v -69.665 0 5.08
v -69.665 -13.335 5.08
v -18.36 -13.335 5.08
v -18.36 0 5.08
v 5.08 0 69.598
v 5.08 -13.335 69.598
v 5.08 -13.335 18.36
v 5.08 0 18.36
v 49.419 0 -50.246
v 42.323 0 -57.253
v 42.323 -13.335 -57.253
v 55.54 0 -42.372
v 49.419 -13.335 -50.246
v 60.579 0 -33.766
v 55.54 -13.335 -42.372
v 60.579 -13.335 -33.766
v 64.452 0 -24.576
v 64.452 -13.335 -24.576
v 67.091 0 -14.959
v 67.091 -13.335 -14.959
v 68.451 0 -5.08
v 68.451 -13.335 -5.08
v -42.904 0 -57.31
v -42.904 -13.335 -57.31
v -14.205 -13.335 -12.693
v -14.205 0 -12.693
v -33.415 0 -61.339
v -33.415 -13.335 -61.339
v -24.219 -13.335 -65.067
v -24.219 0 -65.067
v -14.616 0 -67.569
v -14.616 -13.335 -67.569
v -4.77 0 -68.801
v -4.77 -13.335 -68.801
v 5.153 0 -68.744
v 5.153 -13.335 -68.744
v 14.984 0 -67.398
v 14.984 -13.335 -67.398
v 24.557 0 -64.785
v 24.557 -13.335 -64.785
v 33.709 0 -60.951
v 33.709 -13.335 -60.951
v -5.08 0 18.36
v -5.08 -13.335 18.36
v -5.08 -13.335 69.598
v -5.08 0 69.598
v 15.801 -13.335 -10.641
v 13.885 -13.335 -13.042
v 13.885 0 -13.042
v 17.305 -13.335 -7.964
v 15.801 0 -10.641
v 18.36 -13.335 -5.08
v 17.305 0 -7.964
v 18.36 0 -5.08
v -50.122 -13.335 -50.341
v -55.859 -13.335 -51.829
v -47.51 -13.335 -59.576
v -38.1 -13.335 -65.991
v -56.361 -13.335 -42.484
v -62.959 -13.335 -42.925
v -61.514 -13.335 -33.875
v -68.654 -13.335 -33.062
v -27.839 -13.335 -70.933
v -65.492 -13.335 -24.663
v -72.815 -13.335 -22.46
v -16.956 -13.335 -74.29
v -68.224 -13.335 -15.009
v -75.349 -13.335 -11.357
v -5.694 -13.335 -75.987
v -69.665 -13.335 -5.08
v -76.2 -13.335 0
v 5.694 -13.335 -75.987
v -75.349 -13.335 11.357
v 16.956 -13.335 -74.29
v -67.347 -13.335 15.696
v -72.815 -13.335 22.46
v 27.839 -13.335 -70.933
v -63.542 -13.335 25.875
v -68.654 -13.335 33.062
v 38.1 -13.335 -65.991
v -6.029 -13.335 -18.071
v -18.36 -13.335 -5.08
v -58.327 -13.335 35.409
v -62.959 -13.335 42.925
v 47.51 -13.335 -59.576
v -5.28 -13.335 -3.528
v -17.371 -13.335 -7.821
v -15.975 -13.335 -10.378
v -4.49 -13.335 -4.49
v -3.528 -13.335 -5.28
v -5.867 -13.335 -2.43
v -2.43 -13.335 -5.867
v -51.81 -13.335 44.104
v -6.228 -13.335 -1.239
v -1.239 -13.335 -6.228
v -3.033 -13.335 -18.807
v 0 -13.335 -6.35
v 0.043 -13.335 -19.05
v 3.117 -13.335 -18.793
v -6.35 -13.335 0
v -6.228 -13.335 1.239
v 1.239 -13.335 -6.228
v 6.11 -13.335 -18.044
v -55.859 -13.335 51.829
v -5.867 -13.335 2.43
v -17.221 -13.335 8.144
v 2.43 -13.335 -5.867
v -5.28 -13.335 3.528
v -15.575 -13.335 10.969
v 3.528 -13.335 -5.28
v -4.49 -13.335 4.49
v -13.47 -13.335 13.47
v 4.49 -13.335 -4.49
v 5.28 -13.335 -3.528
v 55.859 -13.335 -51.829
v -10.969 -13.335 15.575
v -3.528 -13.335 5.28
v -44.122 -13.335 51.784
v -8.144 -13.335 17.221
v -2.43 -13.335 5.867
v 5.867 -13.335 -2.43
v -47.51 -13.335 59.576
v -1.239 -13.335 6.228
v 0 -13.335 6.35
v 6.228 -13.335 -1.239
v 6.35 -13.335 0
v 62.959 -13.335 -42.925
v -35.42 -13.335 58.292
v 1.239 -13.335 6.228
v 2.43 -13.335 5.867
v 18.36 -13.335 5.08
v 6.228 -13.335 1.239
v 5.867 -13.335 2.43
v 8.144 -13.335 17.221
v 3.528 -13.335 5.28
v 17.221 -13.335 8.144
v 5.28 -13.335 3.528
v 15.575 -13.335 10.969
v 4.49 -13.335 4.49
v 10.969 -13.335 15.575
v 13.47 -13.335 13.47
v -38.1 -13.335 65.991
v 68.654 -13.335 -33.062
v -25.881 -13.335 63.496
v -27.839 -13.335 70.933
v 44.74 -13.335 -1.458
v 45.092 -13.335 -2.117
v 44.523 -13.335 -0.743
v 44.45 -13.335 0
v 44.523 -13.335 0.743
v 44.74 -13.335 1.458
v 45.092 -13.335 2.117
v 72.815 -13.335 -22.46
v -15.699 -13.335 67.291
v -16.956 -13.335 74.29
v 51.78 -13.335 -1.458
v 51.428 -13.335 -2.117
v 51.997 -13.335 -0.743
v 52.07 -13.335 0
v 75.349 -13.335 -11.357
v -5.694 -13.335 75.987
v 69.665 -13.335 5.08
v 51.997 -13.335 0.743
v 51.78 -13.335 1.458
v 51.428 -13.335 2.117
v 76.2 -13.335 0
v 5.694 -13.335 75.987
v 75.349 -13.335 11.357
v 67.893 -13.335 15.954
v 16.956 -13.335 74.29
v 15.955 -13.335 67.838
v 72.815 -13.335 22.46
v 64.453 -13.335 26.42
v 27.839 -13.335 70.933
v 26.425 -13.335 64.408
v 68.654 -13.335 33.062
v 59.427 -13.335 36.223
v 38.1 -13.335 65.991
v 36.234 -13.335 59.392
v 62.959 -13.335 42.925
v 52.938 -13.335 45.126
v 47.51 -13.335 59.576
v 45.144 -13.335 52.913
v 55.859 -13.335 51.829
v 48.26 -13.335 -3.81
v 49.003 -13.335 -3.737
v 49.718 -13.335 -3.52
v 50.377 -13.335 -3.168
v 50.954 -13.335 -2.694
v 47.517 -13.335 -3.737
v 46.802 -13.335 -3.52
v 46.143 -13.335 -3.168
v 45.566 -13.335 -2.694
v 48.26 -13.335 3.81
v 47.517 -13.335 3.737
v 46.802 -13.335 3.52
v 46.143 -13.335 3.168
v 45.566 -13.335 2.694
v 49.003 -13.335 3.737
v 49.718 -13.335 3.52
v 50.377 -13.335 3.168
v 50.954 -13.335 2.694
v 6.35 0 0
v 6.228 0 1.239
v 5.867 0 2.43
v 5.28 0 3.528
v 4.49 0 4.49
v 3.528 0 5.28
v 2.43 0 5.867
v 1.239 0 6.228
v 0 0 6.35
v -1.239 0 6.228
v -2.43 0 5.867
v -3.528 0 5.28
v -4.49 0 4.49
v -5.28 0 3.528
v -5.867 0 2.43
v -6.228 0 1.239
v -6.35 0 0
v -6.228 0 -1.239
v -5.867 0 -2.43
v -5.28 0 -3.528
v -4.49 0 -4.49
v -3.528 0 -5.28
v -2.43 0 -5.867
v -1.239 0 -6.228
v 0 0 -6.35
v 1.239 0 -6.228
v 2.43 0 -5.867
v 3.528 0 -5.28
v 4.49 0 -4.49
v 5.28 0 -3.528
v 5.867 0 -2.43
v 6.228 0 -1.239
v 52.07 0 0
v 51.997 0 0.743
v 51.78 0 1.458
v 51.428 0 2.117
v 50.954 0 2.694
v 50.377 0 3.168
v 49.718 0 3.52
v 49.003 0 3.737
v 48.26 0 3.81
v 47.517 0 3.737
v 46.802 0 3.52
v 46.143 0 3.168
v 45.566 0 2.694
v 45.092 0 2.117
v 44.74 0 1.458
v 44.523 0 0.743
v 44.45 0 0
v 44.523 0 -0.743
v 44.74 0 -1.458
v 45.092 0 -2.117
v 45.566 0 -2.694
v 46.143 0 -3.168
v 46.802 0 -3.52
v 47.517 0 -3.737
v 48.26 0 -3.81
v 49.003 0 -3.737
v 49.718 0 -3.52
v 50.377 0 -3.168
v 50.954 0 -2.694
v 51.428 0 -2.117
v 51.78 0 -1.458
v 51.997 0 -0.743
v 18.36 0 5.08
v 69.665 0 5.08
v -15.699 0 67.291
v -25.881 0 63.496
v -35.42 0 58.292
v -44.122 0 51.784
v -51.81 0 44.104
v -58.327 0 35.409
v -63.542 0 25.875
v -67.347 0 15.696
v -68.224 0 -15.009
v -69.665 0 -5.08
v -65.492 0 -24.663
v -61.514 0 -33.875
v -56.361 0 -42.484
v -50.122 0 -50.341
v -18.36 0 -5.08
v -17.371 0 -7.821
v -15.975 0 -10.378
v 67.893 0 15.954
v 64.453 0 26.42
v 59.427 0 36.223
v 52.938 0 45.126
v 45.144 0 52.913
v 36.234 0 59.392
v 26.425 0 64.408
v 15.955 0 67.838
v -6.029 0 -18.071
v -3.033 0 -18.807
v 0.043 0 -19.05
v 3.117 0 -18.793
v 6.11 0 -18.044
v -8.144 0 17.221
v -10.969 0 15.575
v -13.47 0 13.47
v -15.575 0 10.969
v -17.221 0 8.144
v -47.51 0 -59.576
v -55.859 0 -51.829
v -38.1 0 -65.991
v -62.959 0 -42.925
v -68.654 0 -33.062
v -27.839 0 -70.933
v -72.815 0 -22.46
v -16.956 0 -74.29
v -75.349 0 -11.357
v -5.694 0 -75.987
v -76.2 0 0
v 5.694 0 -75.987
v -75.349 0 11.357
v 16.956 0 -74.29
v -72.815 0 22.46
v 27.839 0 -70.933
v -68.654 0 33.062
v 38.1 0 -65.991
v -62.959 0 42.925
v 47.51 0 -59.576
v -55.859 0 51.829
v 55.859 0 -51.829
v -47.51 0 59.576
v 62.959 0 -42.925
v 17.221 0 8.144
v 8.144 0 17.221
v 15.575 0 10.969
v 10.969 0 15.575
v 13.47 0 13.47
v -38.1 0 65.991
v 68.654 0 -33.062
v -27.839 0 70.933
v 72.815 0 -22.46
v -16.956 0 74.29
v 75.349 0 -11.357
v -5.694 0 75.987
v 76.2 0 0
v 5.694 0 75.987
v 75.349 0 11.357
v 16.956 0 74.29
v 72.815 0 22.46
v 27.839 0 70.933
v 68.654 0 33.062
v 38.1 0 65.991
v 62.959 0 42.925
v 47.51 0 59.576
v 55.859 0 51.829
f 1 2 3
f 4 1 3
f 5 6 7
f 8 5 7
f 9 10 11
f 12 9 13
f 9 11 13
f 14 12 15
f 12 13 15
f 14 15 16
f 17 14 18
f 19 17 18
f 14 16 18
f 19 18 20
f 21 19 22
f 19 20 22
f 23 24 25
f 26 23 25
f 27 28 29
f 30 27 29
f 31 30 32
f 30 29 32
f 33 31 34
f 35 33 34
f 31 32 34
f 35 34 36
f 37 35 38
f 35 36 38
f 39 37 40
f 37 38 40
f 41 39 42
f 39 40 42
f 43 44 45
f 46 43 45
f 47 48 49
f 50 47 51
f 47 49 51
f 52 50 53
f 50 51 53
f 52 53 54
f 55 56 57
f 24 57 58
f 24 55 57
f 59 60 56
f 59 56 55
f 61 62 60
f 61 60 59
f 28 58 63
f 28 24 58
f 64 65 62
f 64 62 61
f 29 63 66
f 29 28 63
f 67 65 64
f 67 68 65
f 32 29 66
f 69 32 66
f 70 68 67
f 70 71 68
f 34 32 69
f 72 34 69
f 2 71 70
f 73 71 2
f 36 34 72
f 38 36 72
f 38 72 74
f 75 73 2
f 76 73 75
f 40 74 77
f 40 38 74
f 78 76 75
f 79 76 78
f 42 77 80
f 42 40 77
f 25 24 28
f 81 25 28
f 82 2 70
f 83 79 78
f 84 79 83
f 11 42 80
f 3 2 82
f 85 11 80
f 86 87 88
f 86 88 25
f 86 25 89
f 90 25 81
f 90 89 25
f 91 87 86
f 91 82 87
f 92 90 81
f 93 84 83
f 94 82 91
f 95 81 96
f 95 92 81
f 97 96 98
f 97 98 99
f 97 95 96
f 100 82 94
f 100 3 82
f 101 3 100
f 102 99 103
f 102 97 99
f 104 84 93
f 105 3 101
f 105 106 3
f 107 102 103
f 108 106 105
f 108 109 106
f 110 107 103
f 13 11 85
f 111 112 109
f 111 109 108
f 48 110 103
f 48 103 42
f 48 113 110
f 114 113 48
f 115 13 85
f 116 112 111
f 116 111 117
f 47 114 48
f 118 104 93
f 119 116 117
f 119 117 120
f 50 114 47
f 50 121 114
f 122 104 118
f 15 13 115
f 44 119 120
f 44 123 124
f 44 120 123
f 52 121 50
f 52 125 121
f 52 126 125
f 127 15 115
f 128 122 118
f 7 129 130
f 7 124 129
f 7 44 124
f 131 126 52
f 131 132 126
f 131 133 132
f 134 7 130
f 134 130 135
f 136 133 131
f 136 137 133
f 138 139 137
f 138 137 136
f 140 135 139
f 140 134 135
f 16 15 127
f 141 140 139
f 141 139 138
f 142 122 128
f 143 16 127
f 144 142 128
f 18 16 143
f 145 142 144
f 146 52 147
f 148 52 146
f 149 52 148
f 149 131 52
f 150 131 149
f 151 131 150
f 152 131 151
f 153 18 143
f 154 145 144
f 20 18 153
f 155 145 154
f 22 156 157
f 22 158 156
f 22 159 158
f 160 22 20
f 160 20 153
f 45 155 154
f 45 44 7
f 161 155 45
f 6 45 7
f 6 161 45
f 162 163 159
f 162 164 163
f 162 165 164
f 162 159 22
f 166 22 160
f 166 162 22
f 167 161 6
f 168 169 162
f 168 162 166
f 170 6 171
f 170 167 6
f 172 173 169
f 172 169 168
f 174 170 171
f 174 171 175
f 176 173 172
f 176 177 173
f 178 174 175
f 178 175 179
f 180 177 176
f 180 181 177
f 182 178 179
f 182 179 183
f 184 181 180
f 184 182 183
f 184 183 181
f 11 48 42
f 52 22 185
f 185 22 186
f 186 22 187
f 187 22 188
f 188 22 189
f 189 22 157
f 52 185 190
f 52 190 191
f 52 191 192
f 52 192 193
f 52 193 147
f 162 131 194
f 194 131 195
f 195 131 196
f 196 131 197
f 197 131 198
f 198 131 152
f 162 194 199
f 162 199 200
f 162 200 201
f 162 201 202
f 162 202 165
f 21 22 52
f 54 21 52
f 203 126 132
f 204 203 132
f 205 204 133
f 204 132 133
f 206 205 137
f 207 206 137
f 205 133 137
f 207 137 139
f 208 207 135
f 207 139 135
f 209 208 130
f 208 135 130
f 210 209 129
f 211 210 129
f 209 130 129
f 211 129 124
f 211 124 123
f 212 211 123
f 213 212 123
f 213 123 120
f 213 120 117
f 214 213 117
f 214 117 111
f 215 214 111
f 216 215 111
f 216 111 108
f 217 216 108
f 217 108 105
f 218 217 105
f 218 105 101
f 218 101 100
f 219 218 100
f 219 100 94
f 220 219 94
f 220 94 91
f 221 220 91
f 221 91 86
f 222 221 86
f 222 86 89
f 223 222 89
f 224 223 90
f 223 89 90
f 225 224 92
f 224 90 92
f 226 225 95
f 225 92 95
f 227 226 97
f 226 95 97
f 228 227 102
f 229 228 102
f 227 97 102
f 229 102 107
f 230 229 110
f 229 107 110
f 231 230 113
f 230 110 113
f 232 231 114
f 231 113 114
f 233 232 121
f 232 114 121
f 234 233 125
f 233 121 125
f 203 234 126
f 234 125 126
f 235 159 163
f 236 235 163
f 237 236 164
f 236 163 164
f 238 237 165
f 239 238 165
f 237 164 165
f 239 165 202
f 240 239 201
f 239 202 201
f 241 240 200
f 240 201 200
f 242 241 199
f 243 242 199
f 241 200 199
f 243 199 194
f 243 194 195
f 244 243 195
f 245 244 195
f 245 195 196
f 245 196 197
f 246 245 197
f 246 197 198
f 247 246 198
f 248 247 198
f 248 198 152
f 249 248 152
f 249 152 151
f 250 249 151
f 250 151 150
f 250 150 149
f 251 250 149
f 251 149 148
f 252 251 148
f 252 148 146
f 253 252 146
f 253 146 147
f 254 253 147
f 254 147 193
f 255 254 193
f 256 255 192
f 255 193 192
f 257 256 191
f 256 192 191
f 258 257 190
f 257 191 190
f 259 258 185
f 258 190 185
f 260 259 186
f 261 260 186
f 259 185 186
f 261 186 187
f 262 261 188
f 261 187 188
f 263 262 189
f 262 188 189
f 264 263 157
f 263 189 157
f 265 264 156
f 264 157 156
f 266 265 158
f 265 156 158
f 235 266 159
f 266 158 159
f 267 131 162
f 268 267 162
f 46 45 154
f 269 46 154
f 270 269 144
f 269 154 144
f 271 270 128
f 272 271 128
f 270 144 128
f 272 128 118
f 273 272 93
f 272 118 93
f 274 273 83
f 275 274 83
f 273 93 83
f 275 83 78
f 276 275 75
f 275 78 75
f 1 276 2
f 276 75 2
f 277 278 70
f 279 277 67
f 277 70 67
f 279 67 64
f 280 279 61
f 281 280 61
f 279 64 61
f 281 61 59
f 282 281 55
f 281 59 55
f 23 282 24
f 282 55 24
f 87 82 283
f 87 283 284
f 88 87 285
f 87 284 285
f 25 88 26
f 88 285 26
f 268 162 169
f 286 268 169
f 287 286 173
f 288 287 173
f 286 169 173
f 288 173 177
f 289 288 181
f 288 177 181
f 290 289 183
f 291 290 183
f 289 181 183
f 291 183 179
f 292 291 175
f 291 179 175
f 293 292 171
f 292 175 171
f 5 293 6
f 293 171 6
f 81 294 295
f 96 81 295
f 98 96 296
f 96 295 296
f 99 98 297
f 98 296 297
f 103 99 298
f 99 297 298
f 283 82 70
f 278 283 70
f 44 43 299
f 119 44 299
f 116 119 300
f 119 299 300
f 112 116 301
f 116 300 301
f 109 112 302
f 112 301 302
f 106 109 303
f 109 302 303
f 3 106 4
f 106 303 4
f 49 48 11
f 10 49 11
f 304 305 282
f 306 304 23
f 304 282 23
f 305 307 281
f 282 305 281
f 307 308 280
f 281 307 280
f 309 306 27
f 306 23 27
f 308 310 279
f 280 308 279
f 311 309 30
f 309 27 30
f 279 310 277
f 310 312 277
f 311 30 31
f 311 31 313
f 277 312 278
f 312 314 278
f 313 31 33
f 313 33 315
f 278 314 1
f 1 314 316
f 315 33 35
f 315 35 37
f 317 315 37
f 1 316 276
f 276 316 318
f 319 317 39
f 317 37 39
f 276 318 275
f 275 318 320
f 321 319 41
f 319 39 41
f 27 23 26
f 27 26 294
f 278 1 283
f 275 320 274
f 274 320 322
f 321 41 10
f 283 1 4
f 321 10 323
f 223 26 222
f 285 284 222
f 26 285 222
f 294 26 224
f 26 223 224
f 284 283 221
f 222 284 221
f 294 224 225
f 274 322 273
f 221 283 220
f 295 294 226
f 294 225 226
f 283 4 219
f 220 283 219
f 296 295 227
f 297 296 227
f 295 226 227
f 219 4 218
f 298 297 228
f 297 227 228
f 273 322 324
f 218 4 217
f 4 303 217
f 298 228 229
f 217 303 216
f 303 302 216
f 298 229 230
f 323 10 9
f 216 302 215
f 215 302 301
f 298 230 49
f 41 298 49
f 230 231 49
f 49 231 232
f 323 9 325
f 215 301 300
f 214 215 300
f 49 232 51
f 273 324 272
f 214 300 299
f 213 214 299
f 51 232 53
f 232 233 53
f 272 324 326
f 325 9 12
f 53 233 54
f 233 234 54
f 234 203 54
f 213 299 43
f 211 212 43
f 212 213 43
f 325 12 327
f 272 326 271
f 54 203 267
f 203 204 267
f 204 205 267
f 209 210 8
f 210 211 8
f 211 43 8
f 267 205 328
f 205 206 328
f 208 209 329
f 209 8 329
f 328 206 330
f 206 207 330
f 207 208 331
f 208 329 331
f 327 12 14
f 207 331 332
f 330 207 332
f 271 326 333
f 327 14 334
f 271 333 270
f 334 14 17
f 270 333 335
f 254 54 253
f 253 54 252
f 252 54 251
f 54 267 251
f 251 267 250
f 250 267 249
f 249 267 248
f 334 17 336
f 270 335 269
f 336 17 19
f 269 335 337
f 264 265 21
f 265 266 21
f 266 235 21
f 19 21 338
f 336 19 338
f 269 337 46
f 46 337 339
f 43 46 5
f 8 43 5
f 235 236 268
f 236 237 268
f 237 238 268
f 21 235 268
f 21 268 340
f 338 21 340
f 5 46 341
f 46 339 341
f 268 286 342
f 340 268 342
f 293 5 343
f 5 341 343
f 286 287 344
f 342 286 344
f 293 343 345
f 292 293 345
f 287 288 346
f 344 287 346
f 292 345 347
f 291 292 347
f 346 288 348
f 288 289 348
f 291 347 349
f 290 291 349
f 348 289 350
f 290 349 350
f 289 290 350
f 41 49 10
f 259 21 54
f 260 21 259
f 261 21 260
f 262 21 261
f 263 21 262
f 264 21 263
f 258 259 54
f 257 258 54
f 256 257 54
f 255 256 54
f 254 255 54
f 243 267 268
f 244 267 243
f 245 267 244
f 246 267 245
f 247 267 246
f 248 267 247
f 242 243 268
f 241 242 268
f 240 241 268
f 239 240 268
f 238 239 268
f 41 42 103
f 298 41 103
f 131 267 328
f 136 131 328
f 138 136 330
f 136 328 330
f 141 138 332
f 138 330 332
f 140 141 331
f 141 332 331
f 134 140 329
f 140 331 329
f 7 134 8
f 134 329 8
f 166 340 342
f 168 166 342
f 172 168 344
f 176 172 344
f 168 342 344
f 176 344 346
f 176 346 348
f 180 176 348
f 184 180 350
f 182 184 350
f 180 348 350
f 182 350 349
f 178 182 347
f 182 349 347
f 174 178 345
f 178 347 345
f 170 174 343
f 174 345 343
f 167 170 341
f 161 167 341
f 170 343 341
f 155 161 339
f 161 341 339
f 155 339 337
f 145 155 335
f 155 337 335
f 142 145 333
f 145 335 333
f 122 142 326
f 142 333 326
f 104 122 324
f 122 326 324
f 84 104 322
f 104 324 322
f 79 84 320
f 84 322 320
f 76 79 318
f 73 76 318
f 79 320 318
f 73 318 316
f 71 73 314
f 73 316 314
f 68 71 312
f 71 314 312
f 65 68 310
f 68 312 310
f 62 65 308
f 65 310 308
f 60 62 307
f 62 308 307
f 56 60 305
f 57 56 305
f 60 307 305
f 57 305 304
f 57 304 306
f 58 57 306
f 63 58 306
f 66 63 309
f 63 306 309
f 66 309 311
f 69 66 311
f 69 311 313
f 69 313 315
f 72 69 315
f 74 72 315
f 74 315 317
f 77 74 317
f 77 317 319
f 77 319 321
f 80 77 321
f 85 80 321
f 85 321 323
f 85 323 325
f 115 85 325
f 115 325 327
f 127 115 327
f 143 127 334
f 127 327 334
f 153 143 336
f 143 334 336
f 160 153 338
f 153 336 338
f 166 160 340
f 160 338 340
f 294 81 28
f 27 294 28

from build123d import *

# Parameters (mm, degrees)
F0_R      = 76.2
F1_DEPTH  = 13.335
F3_DEPTH  = 13.336
F4_DEPTH  = 25.4
F5_R      = 19.05
F5_R_2    = 6.35
F6_DEPTH  = 13.335
F7_R      = 6.35
F8_DEPTH  = 25.4
F9_R      = 3.81
F10_DEPTH = 25.4


with BuildPart() as f1:
    # F0 (on Front) → F1 (new body)
    with BuildSketch(Plane.XZ):
        Circle(F0_R)
    extrude(amount=F1_DEPTH)

    # F2 (on face) → F3 (cut, through all)
    with BuildSketch(Plane.XZ.offset(13.335)):
        with BuildLine():
            Line((-5.08, 5.08), (-5.08, 69.598076))
            ThreePointArc((-5.08, 69.598076), (-48.103447, 48.081106), (-69.665028, 5.08))
            Line((-69.665028, 5.08), (-5.08, 5.08))
        make_face()
        with BuildLine():
            Line((5.08, 5.08), (69.665028, 5.08))
            ThreePointArc((69.665028, 5.08), (49.192924, 49.171714), (5.08, 69.598076))
            Line((5.08, 69.598076), (5.08, 5.08))
        make_face()
        with BuildLine():
            Line((8.76398, -5.08), (42.323278, -57.252949))
            ThreePointArc((42.323278, -57.252949), (60.579086, -33.766478), (68.451492, -5.08))
            Line((68.451492, -5.08), (8.76398, -5.08))
        make_face()
        with BuildLine():
            Line((0, -8.544917), (-33.414965, -61.338916))
            ThreePointArc((-33.414965, -61.338916), (0.192188, -68.934479), (33.709339, -60.951125))
            Line((33.709339, -60.951125), (0, -8.544917))
        make_face()
        with BuildLine():
            Line((-9.307793, -5.08), (-69.665028, -5.08))
            ThreePointArc((-69.665028, -5.08), (-61.51436, -33.874713), (-42.90387, -57.310125))
            Line((-42.90387, -57.310125), (-9.307793, -5.08))
        make_face()
    extrude(amount=-F3_DEPTH, mode=Mode.SUBTRACT)

    # F2 (on face) → F4 (cut)
    with BuildSketch(Plane.XZ.offset(13.335)):
        with BuildLine():
            Line((-5.08, 5.08), (-5.08, 69.598076))
            ThreePointArc((-5.08, 69.598076), (-48.103447, 48.081106), (-69.665028, 5.08))
            Line((-69.665028, 5.08), (-5.08, 5.08))
        make_face()
        with BuildLine():
            Line((5.08, 5.08), (69.665028, 5.08))
            ThreePointArc((69.665028, 5.08), (49.192924, 49.171714), (5.08, 69.598076))
            Line((5.08, 69.598076), (5.08, 5.08))
        make_face()
        with BuildLine():
            Line((8.76398, -5.08), (42.323278, -57.252949))
            ThreePointArc((42.323278, -57.252949), (60.579086, -33.766478), (68.451492, -5.08))
            Line((68.451492, -5.08), (8.76398, -5.08))
        make_face()
        with BuildLine():
            Line((0, -8.544917), (-33.414965, -61.338916))
            ThreePointArc((-33.414965, -61.338916), (0.192188, -68.934479), (33.709339, -60.951125))
            Line((33.709339, -60.951125), (0, -8.544917))
        make_face()
        with BuildLine():
            Line((-9.307793, -5.08), (-69.665028, -5.08))
            ThreePointArc((-69.665028, -5.08), (-61.51436, -33.874713), (-42.90387, -57.310125))
            Line((-42.90387, -57.310125), (-9.307793, -5.08))
        make_face()
    extrude(amount=-F4_DEPTH, mode=Mode.SUBTRACT)

    # F5 (on Front) → F6 (join)
    with BuildSketch(Plane.XZ):
        Circle(F5_R)
        Circle(F5_R_2, mode=Mode.SUBTRACT)
    extrude(amount=F6_DEPTH)

    # F7 (on face) → F8 (cut)
    with BuildSketch(Plane.XZ.offset(13.335)):
        Circle(F7_R)
    extrude(amount=-F8_DEPTH, mode=Mode.SUBTRACT)

    # F9 (on face) → F10 (cut)
    with BuildSketch(Plane.XZ.offset(13.335)):
        with Locations((48.26, 0)):
            Circle(F9_R)
    extrude(amount=-F10_DEPTH, mode=Mode.SUBTRACT)


solid = f1.part
